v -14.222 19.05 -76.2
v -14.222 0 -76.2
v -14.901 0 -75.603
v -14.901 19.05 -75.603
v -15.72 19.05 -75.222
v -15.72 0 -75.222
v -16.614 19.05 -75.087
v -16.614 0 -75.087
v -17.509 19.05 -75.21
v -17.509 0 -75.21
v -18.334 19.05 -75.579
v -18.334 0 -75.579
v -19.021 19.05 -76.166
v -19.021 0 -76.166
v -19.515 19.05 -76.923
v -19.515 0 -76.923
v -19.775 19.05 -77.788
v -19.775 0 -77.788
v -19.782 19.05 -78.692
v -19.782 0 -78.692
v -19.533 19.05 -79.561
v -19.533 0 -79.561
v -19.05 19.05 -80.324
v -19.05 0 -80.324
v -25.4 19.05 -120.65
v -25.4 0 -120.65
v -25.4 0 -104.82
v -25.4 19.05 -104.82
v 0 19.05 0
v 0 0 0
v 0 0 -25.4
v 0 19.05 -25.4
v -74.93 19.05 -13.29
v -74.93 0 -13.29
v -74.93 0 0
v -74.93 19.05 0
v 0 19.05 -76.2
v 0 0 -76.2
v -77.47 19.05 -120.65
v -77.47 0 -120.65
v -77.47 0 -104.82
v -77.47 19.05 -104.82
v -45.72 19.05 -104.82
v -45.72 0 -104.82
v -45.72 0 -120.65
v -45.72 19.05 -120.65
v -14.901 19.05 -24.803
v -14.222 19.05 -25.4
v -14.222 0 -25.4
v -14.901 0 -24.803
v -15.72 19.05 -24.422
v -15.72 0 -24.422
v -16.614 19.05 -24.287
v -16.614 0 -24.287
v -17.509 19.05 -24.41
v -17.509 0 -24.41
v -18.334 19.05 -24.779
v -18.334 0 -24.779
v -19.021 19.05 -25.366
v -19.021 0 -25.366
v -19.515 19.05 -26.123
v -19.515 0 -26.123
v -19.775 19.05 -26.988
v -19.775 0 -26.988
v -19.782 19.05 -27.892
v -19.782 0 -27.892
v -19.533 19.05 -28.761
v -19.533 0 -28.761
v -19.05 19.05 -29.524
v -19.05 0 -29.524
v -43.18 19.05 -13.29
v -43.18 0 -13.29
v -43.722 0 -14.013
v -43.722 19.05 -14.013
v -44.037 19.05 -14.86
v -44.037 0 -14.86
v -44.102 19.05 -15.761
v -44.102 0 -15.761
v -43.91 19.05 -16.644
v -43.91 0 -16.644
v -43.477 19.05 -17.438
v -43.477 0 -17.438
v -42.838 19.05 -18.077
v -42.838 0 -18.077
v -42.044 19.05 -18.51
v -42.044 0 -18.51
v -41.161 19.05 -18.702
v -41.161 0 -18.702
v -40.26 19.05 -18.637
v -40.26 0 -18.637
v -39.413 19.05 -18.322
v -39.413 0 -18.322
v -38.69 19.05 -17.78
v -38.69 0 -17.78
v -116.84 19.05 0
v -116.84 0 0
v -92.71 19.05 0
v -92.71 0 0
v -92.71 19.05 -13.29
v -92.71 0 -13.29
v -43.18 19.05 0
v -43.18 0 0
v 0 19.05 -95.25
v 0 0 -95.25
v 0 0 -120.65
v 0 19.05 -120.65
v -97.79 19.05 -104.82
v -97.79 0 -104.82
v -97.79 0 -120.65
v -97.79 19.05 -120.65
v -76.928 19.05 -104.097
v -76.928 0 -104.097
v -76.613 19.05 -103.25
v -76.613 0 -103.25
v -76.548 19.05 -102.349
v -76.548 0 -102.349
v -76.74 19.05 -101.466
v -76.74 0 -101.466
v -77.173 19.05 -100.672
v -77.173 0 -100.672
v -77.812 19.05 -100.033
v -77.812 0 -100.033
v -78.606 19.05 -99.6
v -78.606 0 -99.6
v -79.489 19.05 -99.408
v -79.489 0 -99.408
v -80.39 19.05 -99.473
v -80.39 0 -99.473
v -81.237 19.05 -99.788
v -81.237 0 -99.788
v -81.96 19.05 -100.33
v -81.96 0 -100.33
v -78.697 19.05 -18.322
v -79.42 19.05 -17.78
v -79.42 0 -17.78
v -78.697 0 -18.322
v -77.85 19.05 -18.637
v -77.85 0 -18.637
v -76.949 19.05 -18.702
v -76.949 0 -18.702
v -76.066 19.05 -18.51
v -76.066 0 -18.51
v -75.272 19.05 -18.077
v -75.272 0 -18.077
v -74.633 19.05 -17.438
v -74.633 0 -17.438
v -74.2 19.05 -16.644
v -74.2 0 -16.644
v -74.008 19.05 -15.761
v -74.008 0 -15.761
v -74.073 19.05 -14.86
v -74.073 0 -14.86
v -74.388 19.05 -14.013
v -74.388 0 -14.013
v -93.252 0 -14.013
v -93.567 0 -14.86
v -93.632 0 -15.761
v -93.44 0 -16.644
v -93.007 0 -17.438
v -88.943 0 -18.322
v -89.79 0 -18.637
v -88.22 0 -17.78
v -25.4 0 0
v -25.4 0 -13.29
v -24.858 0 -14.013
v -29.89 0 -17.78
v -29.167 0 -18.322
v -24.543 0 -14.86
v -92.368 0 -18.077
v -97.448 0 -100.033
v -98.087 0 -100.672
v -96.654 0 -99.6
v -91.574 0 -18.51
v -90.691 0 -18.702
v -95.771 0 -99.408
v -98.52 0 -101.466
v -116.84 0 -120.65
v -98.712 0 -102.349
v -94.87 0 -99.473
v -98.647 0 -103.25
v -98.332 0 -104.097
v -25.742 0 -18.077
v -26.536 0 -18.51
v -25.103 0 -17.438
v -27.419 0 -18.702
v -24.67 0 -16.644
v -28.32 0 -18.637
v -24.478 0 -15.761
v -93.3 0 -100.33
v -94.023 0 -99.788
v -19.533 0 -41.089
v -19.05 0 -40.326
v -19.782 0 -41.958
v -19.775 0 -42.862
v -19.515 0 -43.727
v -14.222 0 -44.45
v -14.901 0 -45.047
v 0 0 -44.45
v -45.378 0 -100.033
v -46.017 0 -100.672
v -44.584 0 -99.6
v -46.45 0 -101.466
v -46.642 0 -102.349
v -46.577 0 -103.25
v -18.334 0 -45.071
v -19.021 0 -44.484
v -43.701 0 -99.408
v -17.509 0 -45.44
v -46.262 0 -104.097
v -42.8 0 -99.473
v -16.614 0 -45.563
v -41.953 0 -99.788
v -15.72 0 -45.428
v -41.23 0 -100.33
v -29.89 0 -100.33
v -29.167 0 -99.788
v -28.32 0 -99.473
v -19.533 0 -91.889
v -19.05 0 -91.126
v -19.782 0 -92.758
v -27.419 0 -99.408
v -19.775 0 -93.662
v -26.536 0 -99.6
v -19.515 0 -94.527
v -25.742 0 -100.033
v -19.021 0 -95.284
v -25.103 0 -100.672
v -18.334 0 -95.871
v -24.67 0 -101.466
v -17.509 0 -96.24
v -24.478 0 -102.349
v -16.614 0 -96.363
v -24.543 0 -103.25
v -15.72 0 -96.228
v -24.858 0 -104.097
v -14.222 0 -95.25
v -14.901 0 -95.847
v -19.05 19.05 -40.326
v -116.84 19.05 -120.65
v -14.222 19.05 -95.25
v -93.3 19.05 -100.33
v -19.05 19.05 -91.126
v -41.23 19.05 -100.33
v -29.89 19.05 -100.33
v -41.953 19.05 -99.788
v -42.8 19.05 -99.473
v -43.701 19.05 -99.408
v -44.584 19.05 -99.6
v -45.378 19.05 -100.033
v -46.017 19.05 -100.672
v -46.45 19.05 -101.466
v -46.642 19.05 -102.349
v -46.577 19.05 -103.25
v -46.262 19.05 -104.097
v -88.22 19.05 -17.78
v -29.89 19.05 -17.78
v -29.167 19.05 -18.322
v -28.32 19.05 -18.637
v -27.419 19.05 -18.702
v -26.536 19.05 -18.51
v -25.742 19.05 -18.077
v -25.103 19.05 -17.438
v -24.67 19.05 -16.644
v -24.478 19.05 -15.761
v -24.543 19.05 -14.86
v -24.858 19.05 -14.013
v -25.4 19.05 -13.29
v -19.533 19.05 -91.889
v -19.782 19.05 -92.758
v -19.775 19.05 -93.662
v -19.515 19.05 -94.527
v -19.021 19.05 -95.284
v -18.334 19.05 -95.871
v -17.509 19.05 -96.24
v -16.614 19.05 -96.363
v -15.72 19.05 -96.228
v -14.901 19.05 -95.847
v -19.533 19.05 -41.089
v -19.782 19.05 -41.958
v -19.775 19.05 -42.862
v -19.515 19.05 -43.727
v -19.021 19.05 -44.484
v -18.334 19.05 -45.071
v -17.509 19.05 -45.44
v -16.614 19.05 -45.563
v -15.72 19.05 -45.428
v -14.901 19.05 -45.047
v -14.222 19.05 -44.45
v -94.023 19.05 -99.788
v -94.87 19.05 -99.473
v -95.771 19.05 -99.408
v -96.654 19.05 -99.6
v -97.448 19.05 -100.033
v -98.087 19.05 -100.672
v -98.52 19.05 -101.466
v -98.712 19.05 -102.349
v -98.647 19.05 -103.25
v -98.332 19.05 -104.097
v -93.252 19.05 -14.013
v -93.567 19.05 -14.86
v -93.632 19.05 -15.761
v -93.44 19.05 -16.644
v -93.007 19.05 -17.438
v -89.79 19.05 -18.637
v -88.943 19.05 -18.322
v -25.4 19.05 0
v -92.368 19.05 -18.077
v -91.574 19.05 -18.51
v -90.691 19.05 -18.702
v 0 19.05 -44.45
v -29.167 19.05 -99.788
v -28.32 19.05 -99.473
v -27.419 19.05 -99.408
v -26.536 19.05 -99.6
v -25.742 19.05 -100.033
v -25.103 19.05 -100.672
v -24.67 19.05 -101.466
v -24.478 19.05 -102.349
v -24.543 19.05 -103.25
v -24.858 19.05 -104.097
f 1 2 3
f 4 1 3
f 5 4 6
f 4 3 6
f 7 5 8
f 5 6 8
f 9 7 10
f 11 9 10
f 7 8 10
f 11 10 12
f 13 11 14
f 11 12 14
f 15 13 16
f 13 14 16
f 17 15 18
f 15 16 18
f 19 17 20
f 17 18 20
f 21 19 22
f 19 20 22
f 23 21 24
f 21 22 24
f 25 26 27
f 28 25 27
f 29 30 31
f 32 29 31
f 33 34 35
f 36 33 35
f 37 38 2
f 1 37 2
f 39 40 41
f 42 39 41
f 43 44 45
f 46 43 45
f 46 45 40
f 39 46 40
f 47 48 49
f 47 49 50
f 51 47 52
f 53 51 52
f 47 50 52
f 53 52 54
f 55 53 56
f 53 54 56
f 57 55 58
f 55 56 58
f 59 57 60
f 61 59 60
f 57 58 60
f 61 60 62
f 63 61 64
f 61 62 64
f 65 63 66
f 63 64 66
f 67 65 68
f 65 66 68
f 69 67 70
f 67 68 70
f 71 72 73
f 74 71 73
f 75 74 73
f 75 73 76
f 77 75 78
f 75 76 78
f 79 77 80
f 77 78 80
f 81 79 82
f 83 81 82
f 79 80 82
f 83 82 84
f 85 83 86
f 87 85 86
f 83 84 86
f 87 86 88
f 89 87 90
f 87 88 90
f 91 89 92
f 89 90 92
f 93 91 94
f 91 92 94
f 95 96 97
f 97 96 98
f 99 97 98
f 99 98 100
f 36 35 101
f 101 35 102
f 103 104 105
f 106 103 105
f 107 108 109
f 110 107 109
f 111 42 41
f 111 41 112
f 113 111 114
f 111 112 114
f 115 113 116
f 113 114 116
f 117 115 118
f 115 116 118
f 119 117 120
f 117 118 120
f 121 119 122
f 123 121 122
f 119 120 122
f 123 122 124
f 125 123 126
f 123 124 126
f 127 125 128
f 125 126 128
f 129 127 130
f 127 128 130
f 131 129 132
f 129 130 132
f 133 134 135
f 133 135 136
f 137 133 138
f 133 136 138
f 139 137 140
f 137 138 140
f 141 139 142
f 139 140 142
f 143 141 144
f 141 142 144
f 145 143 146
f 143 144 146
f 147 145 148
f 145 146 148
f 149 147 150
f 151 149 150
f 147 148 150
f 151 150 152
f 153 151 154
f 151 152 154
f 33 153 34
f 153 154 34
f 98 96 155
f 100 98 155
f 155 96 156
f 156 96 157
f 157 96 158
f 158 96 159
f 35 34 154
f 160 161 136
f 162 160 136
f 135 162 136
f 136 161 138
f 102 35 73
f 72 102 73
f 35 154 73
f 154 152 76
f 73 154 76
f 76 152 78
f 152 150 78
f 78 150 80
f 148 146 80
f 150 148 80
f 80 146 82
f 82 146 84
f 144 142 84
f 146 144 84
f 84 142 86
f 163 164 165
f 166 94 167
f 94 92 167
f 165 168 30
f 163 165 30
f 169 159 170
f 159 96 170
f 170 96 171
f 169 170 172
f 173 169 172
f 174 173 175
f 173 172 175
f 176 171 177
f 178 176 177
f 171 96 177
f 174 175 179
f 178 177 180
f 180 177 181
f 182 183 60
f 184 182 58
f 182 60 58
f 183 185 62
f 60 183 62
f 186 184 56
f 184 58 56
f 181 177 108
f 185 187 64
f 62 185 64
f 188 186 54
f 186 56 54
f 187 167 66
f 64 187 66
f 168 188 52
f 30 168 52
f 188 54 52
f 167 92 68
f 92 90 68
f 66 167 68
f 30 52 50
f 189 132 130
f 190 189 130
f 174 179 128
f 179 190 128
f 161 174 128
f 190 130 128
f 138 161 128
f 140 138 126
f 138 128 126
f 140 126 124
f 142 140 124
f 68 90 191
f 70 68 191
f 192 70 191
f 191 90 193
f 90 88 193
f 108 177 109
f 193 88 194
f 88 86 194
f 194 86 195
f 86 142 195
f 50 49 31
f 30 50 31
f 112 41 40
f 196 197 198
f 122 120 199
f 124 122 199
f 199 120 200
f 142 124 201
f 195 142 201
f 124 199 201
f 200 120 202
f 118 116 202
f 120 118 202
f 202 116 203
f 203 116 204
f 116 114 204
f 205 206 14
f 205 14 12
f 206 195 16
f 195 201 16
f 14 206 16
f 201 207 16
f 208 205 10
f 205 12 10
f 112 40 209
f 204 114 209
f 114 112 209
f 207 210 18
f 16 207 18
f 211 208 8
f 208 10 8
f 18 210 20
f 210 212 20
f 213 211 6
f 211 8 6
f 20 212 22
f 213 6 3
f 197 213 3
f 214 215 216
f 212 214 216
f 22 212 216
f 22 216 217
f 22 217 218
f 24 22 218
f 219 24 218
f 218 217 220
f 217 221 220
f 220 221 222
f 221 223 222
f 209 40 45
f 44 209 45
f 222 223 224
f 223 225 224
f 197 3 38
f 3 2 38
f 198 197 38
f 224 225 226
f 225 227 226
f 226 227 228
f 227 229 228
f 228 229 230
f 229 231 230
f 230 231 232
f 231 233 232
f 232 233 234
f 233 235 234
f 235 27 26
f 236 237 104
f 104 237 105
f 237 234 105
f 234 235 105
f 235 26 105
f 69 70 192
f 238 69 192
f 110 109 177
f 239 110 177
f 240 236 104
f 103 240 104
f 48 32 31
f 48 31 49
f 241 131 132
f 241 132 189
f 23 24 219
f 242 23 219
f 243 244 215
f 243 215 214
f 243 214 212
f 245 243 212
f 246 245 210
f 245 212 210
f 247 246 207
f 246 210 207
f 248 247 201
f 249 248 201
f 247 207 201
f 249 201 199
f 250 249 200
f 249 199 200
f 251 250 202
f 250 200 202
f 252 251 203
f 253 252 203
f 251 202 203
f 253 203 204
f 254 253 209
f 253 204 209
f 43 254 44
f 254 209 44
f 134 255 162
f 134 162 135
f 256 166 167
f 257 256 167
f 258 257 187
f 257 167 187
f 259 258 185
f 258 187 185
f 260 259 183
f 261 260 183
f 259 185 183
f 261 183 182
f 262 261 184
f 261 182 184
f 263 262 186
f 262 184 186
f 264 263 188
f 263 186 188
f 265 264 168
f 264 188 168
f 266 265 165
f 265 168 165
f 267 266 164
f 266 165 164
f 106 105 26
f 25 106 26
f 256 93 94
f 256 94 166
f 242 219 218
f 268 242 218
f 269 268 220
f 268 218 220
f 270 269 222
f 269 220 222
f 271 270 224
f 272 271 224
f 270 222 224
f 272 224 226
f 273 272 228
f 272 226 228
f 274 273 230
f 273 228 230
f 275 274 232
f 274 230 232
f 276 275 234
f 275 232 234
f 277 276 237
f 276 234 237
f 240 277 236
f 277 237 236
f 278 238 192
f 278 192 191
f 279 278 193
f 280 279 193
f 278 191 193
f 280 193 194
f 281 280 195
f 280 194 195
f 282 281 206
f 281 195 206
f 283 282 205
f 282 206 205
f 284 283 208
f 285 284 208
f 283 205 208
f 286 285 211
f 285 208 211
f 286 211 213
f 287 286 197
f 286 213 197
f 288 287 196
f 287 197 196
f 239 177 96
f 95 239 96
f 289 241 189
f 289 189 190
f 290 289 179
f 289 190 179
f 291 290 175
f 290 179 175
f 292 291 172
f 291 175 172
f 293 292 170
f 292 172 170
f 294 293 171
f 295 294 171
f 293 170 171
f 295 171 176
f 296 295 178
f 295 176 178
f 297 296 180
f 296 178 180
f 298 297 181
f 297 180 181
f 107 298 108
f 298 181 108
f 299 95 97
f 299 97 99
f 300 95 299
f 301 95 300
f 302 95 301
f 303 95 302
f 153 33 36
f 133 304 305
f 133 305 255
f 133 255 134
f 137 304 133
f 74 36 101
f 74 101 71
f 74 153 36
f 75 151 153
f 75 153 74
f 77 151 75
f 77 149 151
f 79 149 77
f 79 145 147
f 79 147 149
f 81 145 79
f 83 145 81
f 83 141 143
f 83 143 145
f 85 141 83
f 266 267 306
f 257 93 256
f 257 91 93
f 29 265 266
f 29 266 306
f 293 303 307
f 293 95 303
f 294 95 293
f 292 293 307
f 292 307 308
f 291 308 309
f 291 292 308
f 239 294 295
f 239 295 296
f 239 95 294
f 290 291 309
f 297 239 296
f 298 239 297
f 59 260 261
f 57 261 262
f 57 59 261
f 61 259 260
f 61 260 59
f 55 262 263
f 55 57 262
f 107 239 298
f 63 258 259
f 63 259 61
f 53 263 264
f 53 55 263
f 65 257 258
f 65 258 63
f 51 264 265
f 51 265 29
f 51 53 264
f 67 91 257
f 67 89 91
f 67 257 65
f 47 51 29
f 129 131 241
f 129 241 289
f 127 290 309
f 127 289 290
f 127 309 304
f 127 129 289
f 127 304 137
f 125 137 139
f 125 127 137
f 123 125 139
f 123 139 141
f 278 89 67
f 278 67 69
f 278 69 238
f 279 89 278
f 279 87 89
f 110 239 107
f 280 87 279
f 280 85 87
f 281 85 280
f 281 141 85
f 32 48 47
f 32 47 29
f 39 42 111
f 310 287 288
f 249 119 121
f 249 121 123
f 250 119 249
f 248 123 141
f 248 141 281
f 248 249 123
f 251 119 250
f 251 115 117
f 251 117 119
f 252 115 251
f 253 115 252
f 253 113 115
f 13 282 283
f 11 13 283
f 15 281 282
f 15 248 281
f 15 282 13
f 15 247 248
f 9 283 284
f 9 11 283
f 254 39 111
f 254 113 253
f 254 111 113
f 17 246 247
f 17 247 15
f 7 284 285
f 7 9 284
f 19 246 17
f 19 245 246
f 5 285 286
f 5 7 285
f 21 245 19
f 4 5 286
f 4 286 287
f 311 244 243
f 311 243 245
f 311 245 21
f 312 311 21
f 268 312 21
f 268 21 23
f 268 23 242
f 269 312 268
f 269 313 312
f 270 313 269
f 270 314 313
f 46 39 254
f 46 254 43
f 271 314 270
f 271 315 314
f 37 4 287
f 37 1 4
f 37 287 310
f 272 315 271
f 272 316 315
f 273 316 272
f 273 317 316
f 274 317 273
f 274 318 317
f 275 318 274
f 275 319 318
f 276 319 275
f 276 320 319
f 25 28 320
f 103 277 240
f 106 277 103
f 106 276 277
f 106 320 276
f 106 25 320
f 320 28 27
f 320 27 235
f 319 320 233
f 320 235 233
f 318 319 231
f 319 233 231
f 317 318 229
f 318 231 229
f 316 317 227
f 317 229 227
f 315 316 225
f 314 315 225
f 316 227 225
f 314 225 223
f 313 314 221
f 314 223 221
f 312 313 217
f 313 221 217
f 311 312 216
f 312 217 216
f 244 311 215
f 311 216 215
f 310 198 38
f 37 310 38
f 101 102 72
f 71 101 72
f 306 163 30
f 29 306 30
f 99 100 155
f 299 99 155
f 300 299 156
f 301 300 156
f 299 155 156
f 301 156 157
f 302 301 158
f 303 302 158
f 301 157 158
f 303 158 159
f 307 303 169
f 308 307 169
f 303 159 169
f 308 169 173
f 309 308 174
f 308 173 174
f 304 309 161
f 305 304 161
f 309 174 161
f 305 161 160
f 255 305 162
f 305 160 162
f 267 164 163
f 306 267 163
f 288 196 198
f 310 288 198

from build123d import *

# Parameters (mm, degrees)
BOSS_EXTRUDE1_DEPTH = 19.05


with BuildPart() as part:
    # Sketch1 → Boss-Extrude1 (new body)
    with BuildSketch(Plane(origin=(0, 0, 0), x_dir=(1, 0, 0), z_dir=(0, 1, 0))):
        with BuildLine():
            Line((-38.689871939, 17.78), (-29.890128061, 17.78))
            ThreePointArc((-29.890128061, 17.78), (-25.4, 17.78), (-25.4, 13.289871939))
            Line((-25.4, 13.289871939), (-25.4, 0))
            Line((-25.4, 0), (0, 0))
            Line((0, 0), (0, 25.4))
            Line((0, 25.4), (-14.2218161, 25.4))
            ThreePointArc((-14.2218161, 25.4), (-18.698135768, 25.048136767), (-19.05, 29.524456356))
            Line((-19.05, 29.524456356), (-19.05, 40.325543644))
            ThreePointArc((-19.05, 40.325543644), (-18.698136331, 44.801863892), (-14.2218161, 44.45))
            Line((-14.2218161, 44.45), (0, 44.45))
            Line((0, 44.45), (0, 76.2))
            Line((0, 76.2), (-14.2218161, 76.2))
            ThreePointArc((-14.2218161, 76.2), (-18.698136228, 75.848136228), (-19.05, 80.324456356))
            Line((-19.05, 80.324456356), (-19.05, 91.125543644))
            ThreePointArc((-19.05, 91.125543644), (-18.698136228, 95.601863772), (-14.2218161, 95.25))
            Line((-14.2218161, 95.25), (0, 95.25))
            Line((0, 95.25), (0, 120.65))
            Line((0, 120.65), (-25.4, 120.65))
            Line((-25.4, 120.65), (-25.4, 104.820128061))
            ThreePointArc((-25.4, 104.820128061), (-25.4, 100.33), (-29.890128061, 100.33))
            Line((-29.890128061, 100.33), (-41.229871939, 100.33))
            ThreePointArc((-41.229871939, 100.33), (-45.72, 100.33), (-45.72, 104.820128061))
            Line((-45.72, 104.820128061), (-45.72, 120.65))
            Line((-45.72, 120.65), (-77.47, 120.65))
            Line((-77.47, 120.65), (-77.47, 104.820128061))
            ThreePointArc((-77.47, 104.820128061), (-77.47, 100.33), (-81.960128061, 100.33))
            Line((-81.960128061, 100.33), (-93.299871939, 100.33))
            ThreePointArc((-93.299871939, 100.33), (-97.79, 100.33), (-97.79, 104.820128061))
            Line((-97.79, 104.820128061), (-97.79, 120.65))
            Line((-97.79, 120.65), (-116.84, 120.65))
            Line((-116.84, 120.65), (-116.84, 0))
            Line((-116.84, 0), (-92.71, 0))
            Line((-92.71, 0), (-92.71, 13.289871939))
            ThreePointArc((-92.71, 13.289871939), (-92.71, 17.78), (-88.219871939, 17.78))
            Line((-88.219871939, 17.78), (-79.420128061, 17.78))
            ThreePointArc((-79.420128061, 17.78), (-74.93, 17.78), (-74.93, 13.289871939))
            Line((-74.93, 13.289871939), (-74.93, 0))
            Line((-74.93, 0), (-43.18, 0))
            Line((-43.18, 0), (-43.18, 13.289871939))
            ThreePointArc((-43.18, 13.289871939), (-43.18, 17.78), (-38.689871939, 17.78))
        make_face()
    extrude(amount=BOSS_EXTRUDE1_DEPTH)


solid = part.part
